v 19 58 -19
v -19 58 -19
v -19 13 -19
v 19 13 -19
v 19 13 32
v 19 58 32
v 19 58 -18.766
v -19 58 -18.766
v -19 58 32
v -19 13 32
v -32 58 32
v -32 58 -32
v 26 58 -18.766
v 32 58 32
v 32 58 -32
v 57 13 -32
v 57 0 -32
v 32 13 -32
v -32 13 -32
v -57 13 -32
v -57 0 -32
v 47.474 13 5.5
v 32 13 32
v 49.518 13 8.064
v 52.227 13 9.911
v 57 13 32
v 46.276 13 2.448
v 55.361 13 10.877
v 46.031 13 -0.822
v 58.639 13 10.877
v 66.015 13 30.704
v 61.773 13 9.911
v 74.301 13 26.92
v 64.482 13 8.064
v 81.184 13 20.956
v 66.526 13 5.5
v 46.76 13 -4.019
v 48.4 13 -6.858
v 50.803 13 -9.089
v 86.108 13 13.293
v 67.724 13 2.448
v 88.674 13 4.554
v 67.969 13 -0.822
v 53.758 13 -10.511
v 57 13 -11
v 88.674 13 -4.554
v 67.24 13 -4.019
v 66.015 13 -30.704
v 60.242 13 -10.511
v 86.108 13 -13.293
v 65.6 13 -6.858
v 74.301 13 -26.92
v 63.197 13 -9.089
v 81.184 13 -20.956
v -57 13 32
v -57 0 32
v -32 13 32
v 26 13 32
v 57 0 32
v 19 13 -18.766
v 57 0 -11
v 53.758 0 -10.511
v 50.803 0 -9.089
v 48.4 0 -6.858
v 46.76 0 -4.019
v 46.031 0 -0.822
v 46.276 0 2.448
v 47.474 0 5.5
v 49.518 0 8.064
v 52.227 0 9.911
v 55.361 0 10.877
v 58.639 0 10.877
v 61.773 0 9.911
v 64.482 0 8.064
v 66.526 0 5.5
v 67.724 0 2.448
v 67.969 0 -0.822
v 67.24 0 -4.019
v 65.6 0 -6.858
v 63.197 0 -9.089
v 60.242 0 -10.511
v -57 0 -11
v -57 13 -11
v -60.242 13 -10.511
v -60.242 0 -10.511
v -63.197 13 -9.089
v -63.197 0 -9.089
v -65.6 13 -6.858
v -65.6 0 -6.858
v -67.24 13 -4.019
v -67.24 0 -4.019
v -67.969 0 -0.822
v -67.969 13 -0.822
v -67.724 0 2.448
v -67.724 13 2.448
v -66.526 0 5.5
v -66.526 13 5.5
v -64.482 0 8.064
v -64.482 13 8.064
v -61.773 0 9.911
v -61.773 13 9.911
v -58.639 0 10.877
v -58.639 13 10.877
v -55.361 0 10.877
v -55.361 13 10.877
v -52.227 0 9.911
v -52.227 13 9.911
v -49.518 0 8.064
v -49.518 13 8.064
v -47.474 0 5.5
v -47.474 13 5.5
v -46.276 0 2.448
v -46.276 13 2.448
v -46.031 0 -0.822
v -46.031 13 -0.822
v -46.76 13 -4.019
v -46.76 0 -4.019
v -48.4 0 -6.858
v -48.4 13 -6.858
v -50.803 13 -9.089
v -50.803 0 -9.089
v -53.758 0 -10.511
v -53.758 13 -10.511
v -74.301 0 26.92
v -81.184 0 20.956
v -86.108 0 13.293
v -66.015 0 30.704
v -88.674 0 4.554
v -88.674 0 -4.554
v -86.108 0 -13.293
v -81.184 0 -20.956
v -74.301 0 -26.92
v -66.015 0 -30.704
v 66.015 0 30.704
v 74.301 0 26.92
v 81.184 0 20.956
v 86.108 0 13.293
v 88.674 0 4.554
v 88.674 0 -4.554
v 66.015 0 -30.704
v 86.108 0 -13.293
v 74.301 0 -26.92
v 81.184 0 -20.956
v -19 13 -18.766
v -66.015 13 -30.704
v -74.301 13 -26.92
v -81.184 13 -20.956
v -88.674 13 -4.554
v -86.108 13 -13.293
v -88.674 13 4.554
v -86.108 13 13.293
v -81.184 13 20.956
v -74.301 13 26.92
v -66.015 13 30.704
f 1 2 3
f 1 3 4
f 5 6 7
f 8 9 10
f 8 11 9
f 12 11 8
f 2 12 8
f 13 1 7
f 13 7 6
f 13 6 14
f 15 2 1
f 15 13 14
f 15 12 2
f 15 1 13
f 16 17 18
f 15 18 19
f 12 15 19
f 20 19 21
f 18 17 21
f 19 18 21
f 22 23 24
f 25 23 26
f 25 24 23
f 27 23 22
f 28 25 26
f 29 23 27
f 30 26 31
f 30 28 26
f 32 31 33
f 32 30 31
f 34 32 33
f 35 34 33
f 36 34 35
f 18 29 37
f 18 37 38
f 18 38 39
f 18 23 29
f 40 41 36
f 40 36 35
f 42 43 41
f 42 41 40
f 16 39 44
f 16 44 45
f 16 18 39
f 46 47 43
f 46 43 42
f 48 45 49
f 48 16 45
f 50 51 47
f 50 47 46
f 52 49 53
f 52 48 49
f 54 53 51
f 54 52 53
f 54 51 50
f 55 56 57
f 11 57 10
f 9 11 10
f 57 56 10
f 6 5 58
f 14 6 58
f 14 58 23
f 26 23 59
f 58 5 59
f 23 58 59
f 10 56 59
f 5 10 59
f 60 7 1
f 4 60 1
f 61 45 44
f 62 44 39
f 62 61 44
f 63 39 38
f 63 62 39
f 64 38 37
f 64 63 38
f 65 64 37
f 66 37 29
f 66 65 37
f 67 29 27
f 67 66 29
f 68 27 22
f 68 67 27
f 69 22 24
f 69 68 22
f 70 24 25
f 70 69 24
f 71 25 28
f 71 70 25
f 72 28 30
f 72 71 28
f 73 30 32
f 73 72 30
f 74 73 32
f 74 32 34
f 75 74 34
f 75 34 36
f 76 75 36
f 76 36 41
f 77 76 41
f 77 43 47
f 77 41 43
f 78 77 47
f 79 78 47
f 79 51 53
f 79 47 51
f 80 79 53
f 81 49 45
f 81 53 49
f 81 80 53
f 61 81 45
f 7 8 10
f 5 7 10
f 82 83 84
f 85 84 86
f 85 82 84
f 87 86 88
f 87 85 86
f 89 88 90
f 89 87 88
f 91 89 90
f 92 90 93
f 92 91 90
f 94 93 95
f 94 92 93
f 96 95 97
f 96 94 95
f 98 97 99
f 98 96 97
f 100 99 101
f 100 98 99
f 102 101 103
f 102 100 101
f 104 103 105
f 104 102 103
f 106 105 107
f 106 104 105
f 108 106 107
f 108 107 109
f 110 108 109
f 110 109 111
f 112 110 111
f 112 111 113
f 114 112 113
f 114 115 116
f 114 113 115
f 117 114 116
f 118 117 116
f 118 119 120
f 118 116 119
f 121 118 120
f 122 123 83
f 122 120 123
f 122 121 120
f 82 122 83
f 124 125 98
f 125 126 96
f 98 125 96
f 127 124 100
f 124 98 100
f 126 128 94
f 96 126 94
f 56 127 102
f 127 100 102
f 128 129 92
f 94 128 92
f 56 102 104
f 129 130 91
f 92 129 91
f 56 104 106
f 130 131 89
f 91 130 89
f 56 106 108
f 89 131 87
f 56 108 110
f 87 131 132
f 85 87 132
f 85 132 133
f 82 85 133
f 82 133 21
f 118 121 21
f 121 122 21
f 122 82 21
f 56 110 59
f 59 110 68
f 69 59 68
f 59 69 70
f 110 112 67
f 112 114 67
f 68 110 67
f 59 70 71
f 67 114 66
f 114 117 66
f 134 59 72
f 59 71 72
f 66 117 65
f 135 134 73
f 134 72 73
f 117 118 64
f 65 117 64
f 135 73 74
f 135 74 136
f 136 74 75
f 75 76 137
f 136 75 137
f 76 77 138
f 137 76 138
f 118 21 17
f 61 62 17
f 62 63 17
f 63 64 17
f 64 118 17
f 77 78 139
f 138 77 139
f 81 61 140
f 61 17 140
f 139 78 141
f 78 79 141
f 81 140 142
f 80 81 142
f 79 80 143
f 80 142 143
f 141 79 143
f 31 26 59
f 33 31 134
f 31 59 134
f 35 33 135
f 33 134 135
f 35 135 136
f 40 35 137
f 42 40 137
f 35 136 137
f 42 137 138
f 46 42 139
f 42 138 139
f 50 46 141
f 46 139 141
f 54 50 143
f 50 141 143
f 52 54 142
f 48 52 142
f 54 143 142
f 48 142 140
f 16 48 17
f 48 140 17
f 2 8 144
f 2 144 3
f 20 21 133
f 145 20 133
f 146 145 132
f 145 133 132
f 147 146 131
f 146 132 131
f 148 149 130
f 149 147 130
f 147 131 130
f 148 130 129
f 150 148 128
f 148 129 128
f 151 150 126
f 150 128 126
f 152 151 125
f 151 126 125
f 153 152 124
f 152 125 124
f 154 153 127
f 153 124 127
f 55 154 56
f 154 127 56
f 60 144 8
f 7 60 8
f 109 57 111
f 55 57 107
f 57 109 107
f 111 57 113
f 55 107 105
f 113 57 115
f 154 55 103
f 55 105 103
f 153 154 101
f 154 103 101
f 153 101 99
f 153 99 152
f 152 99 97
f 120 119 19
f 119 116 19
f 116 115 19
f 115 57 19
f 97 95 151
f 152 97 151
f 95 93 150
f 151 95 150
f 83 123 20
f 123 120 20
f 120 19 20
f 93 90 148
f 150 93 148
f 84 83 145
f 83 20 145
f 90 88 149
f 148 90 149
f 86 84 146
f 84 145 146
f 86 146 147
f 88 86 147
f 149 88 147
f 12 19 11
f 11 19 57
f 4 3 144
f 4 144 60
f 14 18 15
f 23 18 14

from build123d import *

# Parameters (mm, degrees)
SKETCH2_R           = 11
BOSS_EXTRUDE1_DEPTH = 58
CUT_EXTRUDE1_START  = -45
CUT_EXTRUDE1_DEPTH  = 45
SKETCH4_W           = 38
SKETCH4_H           = 51
CUT_EXTRUDE7_DEPTH  = 45
BOSS_EXTRUDE2_DEPTH = 45


with BuildPart() as part:
    # Sketch2 → Boss-Extrude1 (new body)
    with BuildSketch(Plane(origin=(0, 0, 0), x_dir=(1, 0, 0), z_dir=(0, 1, 0))):
        with BuildLine():
            Line((57, 32), (-57, 32))
            ThreePointArc((-57, 32), (-89, 0), (-57, -32))
            Line((-57, -32), (57, -32))
            ThreePointArc((57, -32), (89, 0), (57, 32))
        make_face()
        with Locations(Location((-57, 0, 0), (0, 0, 90))):
            Circle(SKETCH2_R, mode=Mode.SUBTRACT)
        with Locations(Location((57, 0, 0), (0, 0, 90))):
            Circle(SKETCH2_R, mode=Mode.SUBTRACT)
    extrude(amount=BOSS_EXTRUDE1_DEPTH)

    # Sketch3 → Cut-Extrude1 (cut)
    with BuildSketch(Plane(origin=(0, 58, 0), x_dir=(1, 0, 0), z_dir=(0, 1, 0)).offset(CUT_EXTRUDE1_START)):
        with BuildLine():
            Line((-32, 32), (-32, -32))
            Line((-32, -32), (-57, -32))
            ThreePointArc((-57, -32), (-89, 0), (-57, 32))
            Line((-57, 32), (-32, 32))
        make_face()
        with BuildLine():
            Line((32, 32), (32, -32))
            Line((32, -32), (57, -32))
            ThreePointArc((57, -32), (89, 0), (57, 32))
            Line((57, 32), (32, 32))
        make_face()
    extrude(amount=CUT_EXTRUDE1_DEPTH, mode=Mode.SUBTRACT)

    # Sketch4 → Cut-Extrude7 (cut)
    with BuildSketch(Plane(origin=(0, 58, 0), x_dir=(1, 0, 0), z_dir=(0, 1, 0))):
        with Locations((0, -6.5)):
            Rectangle(SKETCH4_W, SKETCH4_H)
    extrude(amount=-CUT_EXTRUDE7_DEPTH, mode=Mode.SUBTRACT)

    # Sketch6 → Boss-Extrude2 (add)
    with BuildSketch(Plane(origin=(-19, 0, 0), x_dir=(0, 0, -1), z_dir=(1, 0, 0))):
        Polygon((18.765593609, 58), (-32, 13), (18.765593609, 13), align=None)
    extrude(amount=BOSS_EXTRUDE2_DEPTH)


solid = part.part
